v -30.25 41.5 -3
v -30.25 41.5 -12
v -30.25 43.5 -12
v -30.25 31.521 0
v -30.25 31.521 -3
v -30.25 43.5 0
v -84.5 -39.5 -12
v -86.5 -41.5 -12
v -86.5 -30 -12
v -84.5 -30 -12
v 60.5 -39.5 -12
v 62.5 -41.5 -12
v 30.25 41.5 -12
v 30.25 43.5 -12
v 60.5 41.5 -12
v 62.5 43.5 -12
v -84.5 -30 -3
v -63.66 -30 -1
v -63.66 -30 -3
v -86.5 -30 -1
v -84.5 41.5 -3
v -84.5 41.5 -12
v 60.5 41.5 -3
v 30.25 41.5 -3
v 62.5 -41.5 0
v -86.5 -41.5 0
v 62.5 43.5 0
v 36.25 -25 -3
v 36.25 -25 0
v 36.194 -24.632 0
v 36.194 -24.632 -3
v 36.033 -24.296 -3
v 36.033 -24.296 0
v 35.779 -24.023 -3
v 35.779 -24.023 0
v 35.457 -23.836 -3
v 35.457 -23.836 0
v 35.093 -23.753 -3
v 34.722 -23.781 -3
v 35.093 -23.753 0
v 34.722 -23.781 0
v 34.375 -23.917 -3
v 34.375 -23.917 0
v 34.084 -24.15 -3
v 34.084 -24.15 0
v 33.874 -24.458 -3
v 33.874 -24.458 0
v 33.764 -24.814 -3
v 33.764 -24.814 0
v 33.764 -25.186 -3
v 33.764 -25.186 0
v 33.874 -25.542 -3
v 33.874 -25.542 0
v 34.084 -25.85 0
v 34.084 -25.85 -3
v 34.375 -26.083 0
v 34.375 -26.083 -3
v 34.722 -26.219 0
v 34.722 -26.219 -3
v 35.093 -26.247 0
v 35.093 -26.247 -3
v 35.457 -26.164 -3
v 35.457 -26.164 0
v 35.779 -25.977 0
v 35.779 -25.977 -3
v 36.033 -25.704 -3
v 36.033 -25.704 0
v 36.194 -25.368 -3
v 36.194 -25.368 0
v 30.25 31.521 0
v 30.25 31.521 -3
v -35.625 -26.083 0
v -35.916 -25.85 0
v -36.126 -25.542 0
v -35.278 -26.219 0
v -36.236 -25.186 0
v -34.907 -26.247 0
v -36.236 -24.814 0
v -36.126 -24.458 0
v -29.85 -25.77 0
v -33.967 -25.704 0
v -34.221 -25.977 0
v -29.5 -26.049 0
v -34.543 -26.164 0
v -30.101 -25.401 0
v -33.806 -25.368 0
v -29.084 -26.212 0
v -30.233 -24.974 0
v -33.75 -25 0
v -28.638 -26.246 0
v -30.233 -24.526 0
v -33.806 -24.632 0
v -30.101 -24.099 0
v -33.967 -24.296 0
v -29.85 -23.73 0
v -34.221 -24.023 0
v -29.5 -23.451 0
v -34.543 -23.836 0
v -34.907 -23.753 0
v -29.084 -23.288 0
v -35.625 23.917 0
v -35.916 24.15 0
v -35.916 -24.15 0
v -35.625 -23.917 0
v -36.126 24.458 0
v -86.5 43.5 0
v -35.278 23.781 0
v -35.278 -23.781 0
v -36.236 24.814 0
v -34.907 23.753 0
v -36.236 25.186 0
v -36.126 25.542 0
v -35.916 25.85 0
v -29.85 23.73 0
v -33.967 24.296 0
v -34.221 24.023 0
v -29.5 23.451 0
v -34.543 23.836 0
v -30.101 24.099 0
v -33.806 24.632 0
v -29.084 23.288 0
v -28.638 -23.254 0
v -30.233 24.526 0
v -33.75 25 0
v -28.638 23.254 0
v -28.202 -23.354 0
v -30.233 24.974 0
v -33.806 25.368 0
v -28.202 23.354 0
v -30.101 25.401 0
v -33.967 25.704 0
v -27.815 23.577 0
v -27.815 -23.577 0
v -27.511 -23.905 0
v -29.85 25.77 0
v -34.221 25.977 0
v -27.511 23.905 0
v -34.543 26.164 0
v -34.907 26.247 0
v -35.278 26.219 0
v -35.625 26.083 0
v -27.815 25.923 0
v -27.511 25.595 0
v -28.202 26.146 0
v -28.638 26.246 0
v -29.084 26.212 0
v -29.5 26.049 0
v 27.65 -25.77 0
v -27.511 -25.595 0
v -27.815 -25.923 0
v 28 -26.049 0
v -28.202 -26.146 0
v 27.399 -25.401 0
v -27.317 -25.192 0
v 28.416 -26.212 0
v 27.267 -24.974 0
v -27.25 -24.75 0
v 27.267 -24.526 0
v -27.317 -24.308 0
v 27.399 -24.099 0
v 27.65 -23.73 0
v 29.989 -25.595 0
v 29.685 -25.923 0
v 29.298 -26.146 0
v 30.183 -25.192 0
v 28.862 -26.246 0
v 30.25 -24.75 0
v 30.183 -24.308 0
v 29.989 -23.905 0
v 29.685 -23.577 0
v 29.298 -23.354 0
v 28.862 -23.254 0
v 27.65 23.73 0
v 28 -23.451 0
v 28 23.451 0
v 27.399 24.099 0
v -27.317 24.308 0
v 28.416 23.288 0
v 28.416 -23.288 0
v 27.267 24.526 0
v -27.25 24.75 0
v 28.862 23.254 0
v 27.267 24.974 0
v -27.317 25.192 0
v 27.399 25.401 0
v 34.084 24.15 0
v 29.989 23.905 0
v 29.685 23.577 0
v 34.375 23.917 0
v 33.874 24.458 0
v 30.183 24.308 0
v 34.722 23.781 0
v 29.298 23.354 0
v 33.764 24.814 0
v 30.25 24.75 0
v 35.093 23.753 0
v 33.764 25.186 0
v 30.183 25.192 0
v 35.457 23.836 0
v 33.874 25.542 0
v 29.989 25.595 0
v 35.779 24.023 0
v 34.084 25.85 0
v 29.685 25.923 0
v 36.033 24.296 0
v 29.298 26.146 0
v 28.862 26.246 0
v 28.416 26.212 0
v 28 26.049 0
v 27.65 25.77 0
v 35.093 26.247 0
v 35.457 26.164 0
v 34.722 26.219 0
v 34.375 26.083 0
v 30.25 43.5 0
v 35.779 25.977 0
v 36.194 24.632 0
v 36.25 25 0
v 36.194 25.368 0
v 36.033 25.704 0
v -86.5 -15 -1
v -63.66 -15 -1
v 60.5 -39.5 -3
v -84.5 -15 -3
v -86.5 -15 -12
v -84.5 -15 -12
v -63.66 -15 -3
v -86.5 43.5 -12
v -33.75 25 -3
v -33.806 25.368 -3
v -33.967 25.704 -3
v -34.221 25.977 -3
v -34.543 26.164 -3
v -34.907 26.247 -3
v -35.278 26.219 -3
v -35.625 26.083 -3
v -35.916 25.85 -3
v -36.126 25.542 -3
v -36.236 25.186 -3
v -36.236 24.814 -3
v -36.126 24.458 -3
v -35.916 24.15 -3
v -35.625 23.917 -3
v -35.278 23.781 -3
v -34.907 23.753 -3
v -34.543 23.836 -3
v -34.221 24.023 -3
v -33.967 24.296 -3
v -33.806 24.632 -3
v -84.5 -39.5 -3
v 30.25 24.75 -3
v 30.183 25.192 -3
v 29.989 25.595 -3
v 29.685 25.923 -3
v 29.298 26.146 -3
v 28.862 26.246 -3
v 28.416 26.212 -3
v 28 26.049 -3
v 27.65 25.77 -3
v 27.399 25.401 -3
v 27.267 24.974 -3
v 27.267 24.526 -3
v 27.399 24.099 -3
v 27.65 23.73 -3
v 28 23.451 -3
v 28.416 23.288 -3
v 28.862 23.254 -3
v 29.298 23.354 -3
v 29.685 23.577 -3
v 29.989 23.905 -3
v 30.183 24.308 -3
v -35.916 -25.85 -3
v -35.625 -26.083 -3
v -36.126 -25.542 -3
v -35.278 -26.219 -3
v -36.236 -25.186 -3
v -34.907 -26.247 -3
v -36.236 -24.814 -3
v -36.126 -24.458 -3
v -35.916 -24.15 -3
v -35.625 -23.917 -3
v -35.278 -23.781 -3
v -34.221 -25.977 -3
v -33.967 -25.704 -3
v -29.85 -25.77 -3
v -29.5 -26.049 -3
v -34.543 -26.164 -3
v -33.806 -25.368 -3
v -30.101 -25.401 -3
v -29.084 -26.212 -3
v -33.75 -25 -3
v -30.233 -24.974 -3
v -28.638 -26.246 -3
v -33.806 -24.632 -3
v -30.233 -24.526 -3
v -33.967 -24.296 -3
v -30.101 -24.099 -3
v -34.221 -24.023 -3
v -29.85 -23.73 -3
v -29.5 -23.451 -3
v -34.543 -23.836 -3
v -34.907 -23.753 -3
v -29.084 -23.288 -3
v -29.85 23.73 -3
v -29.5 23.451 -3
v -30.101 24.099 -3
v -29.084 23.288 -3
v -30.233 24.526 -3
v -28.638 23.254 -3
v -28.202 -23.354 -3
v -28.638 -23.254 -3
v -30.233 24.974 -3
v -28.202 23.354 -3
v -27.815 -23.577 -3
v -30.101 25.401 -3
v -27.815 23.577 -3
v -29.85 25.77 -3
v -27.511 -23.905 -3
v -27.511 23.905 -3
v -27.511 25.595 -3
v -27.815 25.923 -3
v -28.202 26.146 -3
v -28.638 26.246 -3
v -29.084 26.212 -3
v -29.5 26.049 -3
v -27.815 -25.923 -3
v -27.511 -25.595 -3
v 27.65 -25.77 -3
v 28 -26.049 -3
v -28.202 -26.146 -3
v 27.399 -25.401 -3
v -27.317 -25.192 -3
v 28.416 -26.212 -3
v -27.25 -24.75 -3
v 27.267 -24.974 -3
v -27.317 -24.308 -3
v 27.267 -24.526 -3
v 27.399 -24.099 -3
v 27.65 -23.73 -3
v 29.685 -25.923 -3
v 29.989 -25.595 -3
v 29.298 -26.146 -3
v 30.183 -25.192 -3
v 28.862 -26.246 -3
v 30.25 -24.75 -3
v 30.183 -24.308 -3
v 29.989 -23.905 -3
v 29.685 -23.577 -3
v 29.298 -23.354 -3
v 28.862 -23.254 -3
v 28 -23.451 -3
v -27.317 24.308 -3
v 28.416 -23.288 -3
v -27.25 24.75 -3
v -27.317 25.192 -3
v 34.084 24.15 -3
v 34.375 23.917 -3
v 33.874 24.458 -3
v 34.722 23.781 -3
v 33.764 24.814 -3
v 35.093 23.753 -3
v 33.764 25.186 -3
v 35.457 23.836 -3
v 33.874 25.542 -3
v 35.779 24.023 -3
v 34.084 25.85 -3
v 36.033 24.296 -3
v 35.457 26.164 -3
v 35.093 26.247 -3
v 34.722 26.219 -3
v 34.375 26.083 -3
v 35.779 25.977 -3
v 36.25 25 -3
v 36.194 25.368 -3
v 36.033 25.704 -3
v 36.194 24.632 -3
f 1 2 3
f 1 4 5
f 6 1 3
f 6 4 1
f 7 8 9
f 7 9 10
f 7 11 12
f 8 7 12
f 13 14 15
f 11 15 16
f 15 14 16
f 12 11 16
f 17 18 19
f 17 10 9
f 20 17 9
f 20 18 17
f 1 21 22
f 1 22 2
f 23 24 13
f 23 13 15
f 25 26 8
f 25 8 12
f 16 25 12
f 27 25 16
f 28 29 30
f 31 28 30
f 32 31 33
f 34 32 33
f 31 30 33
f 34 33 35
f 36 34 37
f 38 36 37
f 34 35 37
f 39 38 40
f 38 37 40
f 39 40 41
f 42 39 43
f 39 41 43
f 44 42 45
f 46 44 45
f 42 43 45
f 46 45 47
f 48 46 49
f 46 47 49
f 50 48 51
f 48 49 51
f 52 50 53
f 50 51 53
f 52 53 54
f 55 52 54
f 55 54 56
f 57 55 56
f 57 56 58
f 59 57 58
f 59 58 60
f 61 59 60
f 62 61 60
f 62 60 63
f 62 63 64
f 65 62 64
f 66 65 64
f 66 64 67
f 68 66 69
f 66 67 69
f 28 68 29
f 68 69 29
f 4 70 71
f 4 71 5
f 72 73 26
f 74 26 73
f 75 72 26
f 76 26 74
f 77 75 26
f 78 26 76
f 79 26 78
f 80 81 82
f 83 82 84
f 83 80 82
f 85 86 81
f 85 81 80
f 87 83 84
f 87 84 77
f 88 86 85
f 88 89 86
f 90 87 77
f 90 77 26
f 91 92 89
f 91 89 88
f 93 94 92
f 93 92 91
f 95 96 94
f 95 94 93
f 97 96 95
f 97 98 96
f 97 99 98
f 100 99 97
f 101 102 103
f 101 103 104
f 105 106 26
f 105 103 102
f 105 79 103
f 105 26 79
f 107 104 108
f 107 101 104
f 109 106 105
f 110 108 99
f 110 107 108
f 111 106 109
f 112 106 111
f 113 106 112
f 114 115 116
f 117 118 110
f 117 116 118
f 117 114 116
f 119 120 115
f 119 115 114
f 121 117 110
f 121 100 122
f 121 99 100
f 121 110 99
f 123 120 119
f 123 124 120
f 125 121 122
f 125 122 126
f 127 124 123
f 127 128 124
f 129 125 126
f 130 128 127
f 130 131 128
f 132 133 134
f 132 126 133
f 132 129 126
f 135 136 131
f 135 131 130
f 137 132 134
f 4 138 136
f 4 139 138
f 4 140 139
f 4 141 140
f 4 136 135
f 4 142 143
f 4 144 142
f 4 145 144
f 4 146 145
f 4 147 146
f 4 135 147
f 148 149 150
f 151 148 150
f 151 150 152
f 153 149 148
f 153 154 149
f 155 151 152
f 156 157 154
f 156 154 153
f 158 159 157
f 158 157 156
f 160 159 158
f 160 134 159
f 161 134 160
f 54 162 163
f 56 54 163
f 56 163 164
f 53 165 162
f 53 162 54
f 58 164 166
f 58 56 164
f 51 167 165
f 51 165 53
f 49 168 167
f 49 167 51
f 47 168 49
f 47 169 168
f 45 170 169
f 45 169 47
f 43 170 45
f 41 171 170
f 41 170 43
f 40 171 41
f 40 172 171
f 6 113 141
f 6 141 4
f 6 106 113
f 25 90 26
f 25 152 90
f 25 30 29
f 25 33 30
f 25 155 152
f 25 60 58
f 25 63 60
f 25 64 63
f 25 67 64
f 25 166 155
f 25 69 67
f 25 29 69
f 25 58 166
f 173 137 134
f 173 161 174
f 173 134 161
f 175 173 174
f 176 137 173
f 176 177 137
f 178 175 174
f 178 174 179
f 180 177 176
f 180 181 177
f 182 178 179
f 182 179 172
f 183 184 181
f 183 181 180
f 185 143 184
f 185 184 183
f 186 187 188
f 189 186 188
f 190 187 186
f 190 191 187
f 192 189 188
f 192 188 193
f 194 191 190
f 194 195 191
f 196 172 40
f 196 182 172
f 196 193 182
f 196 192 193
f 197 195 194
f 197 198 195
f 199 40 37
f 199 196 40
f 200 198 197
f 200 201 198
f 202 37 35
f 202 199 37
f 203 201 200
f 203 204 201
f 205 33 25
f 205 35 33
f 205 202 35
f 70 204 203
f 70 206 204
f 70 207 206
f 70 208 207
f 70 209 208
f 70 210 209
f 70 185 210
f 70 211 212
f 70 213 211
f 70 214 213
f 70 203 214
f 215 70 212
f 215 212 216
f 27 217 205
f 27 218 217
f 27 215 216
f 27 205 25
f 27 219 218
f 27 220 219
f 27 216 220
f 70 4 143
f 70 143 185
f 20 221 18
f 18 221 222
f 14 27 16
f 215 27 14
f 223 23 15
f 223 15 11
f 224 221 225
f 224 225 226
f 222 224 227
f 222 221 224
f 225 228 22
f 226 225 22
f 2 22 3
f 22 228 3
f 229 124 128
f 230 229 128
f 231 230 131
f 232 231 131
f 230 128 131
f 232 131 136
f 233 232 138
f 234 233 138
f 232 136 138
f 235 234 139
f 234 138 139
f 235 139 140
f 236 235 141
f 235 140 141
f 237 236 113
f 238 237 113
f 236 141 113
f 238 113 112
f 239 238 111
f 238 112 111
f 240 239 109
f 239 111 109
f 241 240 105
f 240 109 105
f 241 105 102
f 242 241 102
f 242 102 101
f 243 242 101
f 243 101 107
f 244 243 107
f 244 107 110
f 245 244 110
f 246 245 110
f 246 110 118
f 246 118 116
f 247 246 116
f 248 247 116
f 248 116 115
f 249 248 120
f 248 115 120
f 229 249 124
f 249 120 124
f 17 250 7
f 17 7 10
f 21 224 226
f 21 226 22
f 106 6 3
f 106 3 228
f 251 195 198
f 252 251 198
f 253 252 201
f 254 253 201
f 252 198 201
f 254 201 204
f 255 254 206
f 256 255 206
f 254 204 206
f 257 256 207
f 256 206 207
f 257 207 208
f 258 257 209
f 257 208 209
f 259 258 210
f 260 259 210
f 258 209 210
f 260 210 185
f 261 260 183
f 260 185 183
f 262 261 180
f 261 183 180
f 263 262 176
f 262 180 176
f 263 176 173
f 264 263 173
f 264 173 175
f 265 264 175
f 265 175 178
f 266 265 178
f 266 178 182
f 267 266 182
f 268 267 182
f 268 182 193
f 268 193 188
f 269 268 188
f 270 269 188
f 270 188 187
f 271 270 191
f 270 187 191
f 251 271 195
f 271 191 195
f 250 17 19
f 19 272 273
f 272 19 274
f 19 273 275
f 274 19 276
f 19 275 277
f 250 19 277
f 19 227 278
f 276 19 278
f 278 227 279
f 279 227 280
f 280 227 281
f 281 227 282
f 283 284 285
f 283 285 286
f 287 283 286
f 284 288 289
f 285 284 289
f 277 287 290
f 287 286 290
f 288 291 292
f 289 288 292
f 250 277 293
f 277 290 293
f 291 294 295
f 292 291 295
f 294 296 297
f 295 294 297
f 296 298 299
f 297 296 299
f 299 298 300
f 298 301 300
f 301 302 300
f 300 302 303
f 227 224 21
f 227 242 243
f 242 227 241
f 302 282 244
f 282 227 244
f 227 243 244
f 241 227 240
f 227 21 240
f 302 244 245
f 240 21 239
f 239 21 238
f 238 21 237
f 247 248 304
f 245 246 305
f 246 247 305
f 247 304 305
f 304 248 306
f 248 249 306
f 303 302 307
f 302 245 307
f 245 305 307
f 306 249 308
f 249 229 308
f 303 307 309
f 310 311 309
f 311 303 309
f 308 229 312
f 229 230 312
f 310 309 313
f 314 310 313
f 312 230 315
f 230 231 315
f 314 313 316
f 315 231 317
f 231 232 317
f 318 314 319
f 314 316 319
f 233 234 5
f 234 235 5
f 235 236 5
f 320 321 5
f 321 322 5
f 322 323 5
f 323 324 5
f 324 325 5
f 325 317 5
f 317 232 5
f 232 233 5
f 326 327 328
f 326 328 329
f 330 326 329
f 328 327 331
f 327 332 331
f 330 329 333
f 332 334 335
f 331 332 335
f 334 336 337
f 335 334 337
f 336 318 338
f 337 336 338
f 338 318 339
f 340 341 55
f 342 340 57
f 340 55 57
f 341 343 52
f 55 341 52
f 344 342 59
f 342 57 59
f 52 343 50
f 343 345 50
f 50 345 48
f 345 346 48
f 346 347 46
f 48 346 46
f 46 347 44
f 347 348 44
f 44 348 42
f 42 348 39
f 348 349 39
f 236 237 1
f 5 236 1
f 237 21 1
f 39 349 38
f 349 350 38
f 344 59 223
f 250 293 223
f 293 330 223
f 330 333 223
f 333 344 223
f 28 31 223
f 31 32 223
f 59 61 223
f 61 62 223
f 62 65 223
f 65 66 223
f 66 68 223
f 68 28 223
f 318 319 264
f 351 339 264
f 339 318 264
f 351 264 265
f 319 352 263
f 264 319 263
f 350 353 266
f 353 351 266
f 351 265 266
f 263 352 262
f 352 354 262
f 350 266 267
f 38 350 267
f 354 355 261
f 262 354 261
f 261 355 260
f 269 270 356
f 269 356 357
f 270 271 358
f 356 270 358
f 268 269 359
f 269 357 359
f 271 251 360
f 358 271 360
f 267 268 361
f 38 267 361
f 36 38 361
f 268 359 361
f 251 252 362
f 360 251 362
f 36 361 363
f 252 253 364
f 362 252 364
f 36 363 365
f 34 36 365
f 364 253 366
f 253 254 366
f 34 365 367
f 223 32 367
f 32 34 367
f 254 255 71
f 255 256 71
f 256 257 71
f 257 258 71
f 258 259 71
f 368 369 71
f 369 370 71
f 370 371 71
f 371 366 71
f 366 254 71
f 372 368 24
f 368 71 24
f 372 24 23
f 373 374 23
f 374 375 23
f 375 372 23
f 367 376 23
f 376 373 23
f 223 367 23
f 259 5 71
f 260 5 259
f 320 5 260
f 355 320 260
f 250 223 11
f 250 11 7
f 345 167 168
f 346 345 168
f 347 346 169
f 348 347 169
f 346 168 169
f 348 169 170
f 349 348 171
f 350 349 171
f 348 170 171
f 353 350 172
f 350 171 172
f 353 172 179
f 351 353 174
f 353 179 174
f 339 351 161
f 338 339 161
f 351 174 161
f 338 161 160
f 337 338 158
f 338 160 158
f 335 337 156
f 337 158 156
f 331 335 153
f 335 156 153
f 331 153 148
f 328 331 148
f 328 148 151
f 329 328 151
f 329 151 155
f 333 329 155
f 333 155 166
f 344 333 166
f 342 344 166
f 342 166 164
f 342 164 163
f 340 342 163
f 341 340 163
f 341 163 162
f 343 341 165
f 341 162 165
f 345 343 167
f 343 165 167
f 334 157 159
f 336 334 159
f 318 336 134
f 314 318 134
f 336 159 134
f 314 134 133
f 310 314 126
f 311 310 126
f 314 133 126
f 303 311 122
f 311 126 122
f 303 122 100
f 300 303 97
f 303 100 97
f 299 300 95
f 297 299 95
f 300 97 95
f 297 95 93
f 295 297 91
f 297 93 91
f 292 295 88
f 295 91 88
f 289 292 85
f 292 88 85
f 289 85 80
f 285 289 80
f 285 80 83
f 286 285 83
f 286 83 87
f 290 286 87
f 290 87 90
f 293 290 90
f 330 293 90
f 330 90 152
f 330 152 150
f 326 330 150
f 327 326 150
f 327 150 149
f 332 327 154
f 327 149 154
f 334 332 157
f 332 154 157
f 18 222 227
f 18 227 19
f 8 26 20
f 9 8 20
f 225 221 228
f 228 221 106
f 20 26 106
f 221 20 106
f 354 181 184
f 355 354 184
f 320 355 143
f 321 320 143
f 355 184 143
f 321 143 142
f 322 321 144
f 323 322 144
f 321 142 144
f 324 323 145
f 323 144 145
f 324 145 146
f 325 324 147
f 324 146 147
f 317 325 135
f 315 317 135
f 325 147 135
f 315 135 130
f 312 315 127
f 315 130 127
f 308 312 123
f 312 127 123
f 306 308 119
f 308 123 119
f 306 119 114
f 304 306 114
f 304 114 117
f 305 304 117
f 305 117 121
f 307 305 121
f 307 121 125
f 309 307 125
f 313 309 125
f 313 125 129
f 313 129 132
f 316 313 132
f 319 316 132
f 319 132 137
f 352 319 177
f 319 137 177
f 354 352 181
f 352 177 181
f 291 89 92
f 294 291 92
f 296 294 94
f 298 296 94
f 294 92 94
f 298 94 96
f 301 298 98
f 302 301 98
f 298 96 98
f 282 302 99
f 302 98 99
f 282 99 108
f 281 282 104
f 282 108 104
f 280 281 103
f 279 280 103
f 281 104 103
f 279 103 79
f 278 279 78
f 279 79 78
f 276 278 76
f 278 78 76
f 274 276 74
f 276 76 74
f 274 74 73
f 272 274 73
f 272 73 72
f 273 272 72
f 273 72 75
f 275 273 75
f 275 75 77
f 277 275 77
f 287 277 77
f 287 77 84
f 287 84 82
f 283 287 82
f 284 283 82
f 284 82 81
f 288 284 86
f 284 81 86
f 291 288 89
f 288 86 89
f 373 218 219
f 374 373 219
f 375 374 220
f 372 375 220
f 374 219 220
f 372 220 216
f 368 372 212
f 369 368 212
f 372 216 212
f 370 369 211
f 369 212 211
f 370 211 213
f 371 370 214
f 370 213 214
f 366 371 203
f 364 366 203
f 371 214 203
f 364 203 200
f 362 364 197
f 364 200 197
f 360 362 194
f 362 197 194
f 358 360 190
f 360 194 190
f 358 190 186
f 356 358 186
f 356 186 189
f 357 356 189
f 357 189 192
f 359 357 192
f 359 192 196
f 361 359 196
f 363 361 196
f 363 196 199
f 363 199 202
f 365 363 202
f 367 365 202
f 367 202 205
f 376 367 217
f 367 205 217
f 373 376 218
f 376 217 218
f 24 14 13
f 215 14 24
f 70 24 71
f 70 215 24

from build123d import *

# Parameters (mm, degrees)
SKETCH_1_R      = 1.25
SKETCH_1_R_2    = 1.5
EXTRUDE_2_DEPTH = 3
EXTRUDE_3_DEPTH = 12
SKETCH_1_4_W    = 20.839933765
SKETCH_1_4_H    = 15
SKETCH_1_4_W_2  = 2
EXTRUDE_4_DEPTH = 1


with BuildPart() as part:
    # 草图1 → 凸台-拉伸2 (new body)
    with BuildSketch(Plane.XY):
        Polygon((-30.25, 31.520504216), (-30.25, 41.5), (-84.5, 41.5), (-84.5, -15), (-63.660066235, -15), (-63.660066235, -30), (-84.5, -30), (-84.5, -39.5), (60.5, -39.5), (60.5, 41.5), (30.25, 41.5), (30.25, 31.520504216), align=None)
        with Locations((-35, -25)):
            Circle(SKETCH_1_R, mode=Mode.SUBTRACT)
        with Locations((-28.75, -24.75)):
            Circle(SKETCH_1_R_2, mode=Mode.SUBTRACT)
        with Locations((28.75, -24.75)):
            Circle(SKETCH_1_R_2, mode=Mode.SUBTRACT)
        with Locations((35, -25)):
            Circle(SKETCH_1_R, mode=Mode.SUBTRACT)
        with Locations((-35, 25)):
            Circle(SKETCH_1_R, mode=Mode.SUBTRACT)
        with Locations((-28.75, 24.75)):
            Circle(SKETCH_1_R_2, mode=Mode.SUBTRACT)
        with Locations((28.75, 24.75)):
            Circle(SKETCH_1_R_2, mode=Mode.SUBTRACT)
        with Locations((35, 25)):
            Circle(SKETCH_1_R, mode=Mode.SUBTRACT)
    extrude(amount=-EXTRUDE_2_DEPTH)

    # 草图1<3> → 凸台-拉伸3 (add)
    with BuildSketch(Plane.XY):
        Polygon((-30.25, 43.5), (-86.5, 43.5), (-86.5, -15), (-84.5, -15), (-84.5, 41.5), (-30.25, 41.5), align=None)
        Polygon((62.5, 43.5), (30.25, 43.5), (30.25, 41.5), (60.5, 41.5), (60.5, -39.5), (-84.5, -39.5), (-84.5, -30), (-86.5, -30), (-86.5, -41.5), (62.5, -41.5), align=None)
    extrude(amount=-EXTRUDE_3_DEPTH)

    # 草图1<4> → 凸台-拉伸4 (add)
    with BuildSketch(Plane.XY):
        with Locations((-74.080033117, -22.5)):
            Rectangle(SKETCH_1_4_W, SKETCH_1_4_H)
        with Locations((-85.5, -22.5)):
            Rectangle(SKETCH_1_4_W_2, SKETCH_1_4_H)
    extrude(amount=-EXTRUDE_4_DEPTH)


solid = part.part
